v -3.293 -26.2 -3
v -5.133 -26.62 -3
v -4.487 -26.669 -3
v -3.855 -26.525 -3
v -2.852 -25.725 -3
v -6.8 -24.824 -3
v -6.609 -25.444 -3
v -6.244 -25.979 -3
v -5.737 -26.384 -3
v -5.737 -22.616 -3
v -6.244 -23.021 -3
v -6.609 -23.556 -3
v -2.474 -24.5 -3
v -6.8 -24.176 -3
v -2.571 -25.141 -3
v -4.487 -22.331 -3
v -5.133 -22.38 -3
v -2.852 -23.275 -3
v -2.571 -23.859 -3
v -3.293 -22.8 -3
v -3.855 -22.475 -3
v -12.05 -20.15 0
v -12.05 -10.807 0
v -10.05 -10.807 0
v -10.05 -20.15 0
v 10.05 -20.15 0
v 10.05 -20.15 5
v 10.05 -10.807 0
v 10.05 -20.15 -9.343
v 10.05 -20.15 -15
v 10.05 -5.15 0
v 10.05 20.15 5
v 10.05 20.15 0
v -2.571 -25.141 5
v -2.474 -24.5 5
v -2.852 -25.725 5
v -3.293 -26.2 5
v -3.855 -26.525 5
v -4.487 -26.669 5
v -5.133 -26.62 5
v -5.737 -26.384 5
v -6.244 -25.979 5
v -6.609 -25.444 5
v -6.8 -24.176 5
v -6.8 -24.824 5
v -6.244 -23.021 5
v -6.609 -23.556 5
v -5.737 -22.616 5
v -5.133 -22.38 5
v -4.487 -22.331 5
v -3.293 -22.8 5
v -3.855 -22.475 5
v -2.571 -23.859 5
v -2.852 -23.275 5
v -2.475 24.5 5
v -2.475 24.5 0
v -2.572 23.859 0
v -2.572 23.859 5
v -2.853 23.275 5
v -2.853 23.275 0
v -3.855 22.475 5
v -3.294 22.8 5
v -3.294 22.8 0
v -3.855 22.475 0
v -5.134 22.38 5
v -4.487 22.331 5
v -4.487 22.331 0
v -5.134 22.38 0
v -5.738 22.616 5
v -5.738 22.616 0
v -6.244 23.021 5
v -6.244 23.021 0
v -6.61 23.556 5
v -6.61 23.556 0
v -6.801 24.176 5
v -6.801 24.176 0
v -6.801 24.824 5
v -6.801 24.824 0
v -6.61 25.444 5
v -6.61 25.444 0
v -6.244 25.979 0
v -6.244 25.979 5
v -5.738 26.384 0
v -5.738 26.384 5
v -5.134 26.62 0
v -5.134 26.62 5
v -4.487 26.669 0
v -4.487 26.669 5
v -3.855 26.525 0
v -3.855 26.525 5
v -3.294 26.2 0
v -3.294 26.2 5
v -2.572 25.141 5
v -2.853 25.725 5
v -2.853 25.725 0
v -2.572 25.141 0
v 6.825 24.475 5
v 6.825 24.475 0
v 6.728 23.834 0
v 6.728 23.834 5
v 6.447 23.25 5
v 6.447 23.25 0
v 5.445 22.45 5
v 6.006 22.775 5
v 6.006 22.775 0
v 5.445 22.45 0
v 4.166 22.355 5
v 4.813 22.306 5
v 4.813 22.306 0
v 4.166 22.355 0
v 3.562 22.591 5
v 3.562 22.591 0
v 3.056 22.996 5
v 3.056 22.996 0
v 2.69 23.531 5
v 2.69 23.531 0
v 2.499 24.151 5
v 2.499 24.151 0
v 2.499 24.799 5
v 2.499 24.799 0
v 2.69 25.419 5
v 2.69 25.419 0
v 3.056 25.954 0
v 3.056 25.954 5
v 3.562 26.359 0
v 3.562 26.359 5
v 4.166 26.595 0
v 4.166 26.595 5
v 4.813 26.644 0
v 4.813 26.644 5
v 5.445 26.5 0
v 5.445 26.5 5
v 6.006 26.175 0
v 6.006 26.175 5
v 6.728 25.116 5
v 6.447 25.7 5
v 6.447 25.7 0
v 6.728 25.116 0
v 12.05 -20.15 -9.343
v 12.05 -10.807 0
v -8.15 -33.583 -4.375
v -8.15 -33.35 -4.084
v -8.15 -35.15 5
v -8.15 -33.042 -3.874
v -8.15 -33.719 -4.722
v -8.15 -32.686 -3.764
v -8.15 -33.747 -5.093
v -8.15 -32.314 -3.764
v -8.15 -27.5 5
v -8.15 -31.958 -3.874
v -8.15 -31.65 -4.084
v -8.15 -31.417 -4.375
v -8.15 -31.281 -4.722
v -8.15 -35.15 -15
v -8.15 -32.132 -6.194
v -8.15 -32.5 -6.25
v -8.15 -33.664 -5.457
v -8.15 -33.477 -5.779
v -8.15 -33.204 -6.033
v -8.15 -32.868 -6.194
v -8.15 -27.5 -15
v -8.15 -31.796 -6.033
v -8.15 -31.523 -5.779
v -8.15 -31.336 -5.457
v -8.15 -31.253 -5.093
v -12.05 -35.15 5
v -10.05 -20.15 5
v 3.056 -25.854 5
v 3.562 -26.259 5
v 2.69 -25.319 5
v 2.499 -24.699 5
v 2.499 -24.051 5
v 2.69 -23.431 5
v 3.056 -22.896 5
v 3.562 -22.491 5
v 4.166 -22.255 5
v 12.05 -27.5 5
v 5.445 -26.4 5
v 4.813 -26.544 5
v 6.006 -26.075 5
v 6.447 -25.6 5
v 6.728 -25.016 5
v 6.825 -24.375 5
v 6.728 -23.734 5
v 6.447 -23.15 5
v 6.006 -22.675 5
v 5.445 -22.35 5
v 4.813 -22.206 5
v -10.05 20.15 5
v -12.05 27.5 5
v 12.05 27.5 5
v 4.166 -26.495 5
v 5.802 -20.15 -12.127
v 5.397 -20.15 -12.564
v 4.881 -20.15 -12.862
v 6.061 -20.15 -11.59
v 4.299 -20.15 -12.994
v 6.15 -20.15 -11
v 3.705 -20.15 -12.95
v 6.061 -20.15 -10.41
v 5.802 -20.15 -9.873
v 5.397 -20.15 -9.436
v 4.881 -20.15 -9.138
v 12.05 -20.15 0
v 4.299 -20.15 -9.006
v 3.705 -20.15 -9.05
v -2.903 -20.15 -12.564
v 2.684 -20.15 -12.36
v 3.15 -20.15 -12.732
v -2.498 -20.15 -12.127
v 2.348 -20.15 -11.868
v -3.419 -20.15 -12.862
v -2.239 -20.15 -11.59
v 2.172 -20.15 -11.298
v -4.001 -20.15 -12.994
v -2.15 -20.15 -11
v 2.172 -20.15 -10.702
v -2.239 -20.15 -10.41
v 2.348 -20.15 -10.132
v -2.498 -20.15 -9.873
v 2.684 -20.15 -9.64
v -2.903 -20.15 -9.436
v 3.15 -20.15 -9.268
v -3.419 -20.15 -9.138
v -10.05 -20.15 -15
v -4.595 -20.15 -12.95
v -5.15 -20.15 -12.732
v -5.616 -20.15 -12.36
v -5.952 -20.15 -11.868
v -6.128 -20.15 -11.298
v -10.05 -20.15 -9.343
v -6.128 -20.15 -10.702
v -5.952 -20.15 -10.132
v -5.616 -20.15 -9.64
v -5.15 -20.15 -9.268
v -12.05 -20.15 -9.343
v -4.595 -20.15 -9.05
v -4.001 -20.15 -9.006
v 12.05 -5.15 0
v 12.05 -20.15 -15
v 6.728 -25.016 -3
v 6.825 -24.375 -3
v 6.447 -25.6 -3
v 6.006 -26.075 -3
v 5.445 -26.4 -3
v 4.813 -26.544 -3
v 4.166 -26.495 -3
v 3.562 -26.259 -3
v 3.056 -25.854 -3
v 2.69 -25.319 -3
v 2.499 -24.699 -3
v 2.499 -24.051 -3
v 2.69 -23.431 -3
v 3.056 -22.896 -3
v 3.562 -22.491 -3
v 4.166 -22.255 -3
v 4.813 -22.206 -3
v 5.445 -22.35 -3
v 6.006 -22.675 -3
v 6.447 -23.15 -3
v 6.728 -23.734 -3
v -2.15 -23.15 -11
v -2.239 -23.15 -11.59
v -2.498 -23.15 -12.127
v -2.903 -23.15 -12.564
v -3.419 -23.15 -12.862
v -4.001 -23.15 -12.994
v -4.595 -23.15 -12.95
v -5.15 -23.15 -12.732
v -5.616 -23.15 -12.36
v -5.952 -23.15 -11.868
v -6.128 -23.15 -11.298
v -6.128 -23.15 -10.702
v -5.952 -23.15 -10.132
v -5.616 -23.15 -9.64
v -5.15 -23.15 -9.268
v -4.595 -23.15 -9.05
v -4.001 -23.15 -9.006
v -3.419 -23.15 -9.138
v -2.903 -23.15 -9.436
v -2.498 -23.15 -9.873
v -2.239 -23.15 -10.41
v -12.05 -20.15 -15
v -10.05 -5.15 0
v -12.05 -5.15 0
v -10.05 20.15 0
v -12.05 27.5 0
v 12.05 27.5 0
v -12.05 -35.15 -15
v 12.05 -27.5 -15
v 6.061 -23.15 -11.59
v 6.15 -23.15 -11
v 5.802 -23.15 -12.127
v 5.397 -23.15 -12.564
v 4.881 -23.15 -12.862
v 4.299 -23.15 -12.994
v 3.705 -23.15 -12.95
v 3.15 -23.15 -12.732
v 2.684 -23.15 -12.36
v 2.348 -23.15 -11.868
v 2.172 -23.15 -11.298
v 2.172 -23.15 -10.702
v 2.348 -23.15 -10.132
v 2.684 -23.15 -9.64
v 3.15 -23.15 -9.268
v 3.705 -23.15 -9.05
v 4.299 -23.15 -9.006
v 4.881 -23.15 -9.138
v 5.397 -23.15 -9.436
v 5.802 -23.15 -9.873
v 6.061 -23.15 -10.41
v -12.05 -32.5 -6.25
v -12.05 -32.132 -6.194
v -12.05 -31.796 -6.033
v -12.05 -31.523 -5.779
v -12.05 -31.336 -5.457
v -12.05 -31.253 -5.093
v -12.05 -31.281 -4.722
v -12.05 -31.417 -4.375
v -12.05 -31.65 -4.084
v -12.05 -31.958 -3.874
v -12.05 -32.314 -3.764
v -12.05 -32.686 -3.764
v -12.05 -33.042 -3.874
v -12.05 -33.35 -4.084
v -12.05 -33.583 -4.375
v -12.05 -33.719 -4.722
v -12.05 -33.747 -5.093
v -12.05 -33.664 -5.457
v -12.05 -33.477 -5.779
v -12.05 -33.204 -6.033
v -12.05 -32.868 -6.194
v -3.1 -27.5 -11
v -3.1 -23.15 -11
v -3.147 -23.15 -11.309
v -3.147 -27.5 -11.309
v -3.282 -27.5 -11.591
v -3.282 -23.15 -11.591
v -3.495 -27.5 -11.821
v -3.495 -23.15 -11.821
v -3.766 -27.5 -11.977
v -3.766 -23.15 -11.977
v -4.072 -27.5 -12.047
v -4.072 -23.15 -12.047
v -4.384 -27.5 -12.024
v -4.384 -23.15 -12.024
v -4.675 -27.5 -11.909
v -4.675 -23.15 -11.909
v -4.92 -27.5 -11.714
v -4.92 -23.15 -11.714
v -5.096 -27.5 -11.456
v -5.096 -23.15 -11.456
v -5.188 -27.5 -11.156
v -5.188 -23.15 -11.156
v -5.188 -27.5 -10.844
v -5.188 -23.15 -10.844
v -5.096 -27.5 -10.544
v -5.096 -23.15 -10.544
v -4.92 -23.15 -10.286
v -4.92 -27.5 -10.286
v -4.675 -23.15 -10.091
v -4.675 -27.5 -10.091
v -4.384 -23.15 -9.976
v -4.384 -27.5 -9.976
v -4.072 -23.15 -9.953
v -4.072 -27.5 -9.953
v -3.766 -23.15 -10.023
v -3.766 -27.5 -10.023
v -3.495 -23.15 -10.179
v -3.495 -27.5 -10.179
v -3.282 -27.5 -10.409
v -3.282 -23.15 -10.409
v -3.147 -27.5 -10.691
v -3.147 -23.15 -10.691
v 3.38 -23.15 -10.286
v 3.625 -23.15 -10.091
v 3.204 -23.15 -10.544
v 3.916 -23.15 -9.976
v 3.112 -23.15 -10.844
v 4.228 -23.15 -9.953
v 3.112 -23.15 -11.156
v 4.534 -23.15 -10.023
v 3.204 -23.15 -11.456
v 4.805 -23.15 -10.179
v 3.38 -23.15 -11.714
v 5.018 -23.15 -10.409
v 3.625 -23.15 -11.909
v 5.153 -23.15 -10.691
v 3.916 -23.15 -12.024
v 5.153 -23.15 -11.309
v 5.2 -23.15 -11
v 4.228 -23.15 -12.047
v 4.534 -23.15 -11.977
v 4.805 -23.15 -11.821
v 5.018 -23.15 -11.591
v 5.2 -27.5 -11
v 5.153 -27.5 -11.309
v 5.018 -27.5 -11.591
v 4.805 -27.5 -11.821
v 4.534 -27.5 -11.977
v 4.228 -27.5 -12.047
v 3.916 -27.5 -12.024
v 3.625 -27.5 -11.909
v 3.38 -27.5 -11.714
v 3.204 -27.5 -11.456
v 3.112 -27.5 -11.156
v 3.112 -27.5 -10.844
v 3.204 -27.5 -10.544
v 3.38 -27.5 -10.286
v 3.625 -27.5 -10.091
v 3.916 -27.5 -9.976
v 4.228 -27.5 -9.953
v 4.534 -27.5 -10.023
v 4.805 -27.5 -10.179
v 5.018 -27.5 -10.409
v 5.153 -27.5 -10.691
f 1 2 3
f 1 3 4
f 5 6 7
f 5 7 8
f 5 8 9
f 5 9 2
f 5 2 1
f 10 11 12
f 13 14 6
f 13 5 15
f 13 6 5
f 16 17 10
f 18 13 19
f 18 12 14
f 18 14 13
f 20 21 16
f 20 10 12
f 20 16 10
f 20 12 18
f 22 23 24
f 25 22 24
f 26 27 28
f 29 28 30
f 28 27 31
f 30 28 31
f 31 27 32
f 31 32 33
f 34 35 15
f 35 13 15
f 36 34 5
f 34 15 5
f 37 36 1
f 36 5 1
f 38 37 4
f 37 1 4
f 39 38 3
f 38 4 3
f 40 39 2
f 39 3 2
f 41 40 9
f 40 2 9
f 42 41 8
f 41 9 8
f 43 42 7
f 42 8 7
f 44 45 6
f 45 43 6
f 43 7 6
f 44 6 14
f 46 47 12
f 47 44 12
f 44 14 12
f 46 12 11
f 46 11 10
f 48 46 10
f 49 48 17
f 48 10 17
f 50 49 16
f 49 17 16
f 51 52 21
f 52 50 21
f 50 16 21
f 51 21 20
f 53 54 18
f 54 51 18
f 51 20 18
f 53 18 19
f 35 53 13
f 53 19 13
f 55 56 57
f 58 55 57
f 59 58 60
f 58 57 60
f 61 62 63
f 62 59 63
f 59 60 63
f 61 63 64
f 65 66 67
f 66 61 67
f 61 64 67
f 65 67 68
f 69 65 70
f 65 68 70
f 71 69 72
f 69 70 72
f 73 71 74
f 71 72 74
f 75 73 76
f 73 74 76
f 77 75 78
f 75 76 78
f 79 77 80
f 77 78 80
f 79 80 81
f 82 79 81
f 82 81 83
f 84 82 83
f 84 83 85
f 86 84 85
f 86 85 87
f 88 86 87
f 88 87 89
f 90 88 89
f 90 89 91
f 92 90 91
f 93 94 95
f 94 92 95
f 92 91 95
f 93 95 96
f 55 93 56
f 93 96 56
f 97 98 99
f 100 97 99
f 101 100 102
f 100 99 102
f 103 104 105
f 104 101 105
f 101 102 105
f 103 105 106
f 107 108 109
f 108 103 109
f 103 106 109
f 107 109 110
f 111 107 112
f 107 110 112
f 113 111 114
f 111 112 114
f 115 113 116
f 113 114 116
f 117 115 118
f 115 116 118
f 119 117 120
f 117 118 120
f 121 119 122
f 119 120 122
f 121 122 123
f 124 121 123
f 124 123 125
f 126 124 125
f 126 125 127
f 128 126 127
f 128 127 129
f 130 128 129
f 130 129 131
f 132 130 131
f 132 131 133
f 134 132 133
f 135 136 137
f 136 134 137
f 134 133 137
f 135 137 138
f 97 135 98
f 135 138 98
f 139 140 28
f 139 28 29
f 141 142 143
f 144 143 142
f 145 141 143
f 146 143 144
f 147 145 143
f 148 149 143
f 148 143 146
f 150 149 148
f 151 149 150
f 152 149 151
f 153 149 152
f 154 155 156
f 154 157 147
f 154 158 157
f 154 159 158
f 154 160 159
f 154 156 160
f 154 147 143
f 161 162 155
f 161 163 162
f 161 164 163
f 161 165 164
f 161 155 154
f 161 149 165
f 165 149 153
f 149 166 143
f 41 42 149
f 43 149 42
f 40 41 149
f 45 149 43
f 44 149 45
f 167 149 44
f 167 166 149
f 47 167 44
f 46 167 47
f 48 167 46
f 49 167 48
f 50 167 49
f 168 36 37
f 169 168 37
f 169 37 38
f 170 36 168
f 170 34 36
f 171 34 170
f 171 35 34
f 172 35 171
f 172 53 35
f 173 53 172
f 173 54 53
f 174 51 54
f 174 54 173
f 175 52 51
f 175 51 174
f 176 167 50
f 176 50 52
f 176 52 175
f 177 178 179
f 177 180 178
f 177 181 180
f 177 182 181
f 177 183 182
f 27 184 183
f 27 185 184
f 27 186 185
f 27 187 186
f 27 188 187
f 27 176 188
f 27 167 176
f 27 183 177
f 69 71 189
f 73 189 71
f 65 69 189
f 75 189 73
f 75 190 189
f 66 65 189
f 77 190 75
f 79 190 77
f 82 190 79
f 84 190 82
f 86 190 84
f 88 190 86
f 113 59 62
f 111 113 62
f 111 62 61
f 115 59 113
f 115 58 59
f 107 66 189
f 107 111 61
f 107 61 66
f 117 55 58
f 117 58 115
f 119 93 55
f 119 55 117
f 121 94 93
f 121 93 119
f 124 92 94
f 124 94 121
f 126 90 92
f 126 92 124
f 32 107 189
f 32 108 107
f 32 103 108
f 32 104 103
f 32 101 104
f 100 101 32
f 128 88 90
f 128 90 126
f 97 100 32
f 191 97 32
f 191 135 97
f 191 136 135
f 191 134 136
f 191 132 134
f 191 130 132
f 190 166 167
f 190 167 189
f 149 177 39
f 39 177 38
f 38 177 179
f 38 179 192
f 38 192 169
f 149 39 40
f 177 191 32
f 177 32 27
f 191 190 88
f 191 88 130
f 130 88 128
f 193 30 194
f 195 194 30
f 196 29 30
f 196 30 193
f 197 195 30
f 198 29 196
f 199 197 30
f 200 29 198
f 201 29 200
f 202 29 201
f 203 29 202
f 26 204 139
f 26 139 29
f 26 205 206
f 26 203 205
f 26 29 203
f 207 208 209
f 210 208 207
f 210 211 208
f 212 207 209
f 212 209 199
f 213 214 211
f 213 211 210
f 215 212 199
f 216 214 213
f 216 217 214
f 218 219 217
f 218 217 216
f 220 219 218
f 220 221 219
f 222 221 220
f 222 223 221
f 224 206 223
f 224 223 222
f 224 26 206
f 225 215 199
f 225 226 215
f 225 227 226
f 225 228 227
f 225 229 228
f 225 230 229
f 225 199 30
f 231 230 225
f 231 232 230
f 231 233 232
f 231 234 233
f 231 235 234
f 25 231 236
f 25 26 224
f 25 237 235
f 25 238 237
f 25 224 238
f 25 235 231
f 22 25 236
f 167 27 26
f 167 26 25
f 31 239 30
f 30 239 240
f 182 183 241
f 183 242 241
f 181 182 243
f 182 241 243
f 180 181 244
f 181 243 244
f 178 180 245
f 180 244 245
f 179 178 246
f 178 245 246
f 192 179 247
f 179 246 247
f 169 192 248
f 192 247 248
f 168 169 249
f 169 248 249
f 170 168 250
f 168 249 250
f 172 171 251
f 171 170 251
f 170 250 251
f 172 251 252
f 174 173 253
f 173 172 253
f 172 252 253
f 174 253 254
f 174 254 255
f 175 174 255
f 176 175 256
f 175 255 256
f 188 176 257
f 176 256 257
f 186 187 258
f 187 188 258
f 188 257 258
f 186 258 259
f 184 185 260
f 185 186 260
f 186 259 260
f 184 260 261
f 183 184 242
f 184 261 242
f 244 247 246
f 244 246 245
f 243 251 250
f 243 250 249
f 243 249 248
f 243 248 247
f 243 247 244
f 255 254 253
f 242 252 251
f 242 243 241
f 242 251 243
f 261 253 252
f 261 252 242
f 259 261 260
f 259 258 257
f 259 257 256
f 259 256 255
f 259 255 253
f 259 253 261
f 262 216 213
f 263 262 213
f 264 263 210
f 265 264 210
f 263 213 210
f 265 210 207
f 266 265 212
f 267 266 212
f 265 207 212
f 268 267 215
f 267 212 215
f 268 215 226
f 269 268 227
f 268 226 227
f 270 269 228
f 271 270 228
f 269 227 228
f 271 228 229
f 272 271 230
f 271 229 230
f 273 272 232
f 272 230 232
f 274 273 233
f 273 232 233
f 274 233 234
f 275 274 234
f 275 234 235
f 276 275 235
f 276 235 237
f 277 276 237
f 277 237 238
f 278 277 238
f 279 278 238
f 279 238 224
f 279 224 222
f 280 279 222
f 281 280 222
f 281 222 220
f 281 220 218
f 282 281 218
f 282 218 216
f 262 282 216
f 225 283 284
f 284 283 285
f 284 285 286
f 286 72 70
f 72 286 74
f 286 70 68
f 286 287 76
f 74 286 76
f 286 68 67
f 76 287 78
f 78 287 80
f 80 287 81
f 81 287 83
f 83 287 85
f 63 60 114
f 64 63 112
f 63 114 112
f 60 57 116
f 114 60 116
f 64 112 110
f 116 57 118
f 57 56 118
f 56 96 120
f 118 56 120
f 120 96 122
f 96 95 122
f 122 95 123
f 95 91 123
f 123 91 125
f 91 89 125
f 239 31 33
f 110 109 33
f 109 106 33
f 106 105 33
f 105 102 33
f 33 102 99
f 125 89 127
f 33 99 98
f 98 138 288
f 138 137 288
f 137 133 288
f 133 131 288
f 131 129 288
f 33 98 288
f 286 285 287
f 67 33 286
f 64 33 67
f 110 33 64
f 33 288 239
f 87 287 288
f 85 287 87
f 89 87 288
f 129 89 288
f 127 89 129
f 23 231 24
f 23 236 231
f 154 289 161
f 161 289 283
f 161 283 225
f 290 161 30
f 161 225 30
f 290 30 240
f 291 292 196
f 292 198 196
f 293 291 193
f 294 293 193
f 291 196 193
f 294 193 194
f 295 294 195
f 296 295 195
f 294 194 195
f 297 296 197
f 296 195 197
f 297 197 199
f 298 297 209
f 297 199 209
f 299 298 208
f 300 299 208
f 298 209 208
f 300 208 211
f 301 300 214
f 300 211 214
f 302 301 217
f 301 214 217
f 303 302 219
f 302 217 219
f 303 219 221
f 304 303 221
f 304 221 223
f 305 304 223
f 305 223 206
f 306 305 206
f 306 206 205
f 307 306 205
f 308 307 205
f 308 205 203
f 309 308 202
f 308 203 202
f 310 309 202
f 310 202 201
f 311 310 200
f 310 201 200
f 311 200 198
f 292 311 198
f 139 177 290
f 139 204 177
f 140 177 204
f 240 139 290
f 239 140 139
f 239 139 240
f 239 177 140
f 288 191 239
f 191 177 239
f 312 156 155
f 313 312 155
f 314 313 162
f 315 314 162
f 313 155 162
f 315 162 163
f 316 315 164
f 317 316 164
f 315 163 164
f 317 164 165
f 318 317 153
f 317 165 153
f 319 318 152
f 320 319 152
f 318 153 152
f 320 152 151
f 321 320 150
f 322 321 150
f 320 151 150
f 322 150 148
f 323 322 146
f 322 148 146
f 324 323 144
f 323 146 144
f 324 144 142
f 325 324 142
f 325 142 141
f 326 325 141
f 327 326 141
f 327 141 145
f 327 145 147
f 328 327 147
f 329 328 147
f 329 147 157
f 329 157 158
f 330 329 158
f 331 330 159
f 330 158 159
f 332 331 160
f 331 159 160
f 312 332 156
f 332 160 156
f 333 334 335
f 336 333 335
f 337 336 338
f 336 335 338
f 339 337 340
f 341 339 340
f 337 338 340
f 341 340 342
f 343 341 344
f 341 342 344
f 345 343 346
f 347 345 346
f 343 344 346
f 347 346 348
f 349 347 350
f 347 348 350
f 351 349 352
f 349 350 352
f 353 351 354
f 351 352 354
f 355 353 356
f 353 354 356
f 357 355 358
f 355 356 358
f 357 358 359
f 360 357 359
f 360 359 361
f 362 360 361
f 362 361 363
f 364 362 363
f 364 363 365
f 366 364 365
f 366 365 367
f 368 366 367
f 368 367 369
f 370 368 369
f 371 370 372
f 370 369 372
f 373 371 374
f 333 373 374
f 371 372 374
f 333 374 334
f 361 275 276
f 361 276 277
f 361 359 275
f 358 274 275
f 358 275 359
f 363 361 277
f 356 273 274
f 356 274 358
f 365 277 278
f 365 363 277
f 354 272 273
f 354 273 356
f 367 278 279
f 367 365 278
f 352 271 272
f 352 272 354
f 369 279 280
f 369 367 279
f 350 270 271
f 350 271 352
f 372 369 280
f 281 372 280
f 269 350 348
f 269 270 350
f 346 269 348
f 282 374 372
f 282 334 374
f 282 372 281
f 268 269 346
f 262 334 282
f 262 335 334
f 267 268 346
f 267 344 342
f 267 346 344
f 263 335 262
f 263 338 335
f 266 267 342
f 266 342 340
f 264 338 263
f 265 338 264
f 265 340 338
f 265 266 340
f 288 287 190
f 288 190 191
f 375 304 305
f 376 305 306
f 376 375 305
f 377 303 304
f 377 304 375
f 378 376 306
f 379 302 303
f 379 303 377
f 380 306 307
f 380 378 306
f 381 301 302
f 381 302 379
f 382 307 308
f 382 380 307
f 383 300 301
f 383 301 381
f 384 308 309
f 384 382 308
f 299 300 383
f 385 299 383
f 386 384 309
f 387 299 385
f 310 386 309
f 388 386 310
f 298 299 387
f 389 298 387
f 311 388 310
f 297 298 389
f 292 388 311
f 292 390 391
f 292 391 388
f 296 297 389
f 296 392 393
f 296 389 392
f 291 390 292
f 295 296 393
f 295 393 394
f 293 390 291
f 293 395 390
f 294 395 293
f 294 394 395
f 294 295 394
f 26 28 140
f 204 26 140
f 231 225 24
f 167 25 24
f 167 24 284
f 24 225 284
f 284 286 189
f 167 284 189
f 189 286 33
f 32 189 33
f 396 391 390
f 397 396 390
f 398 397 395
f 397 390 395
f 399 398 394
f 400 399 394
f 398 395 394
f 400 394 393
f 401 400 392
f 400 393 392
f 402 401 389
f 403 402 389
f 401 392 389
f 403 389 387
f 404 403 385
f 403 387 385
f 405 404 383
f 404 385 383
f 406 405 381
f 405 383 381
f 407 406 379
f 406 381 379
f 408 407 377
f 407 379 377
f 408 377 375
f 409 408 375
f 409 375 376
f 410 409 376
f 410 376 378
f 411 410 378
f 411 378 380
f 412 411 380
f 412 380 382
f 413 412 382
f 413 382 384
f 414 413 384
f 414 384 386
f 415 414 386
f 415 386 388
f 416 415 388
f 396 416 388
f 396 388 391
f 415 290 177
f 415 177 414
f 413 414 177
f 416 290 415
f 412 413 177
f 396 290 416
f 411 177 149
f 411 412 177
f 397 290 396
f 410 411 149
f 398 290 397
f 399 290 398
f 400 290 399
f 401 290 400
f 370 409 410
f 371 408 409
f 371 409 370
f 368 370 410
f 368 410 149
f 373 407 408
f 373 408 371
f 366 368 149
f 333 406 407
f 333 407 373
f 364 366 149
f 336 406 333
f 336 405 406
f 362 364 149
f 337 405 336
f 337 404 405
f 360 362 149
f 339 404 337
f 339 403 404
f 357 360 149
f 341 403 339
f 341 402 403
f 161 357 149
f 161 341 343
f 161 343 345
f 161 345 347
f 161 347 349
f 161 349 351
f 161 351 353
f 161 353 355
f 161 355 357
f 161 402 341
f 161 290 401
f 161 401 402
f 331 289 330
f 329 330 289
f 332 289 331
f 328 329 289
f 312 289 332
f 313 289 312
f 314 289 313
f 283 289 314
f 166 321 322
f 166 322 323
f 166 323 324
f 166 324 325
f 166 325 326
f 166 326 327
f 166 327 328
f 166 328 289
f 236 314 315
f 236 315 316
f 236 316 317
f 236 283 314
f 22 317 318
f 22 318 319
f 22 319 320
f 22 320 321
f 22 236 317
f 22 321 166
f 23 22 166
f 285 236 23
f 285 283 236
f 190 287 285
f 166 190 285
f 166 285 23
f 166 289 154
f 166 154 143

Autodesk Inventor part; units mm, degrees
ref_plane "YZ Plane" through (0, 0, 0) normal (1, 0, 0) x (0, 1, 0)
ref_plane "XZ Plane" through (0, 0, 0) normal (0, 1, 0) x (-1, 0, 0)
sketch "Sketch1" plane through (0, 0, 0) normal (0, 0, 1) x (1, 0, 0)
  line L0 (-12.05, 27.5) -> (12.05, 27.5)
  line L1 (12.05, 27.5) -> (12.05, -27.5)
  line L2 (12.05, -27.5) -> (-12.05, -27.5)
  line L3 (-12.05, -27.5) -> (-12.05, 27.5)
  line L4 (-10.05, 20.15) -> (10.05, 20.15)
  line L5 (10.05, 20.15) -> (10.05, -20.15)
  line L6 (10.05, -20.15) -> (-10.05, -20.15)
  line L7 (-10.05, -20.15) -> (-10.05, 20.15)
  line L8 (0, 0) -> (0, 17.7516) construction
  line L9 (0, 0) -> (17.0454, 0) construction
  line L10 (-12.05, -27.5) -> (12.05, -27.5)
  line L11 (12.05, -27.5) -> (12.05, -20.15)
  line L12 (12.05, -20.15) -> (-12.05, -20.15)
  line L13 (-12.05, -20.15) -> (-12.05, -27.5)
  circle A0 centre (-4.65, 24.5) radius 2.175
  circle A1 centre (4.65, 24.475) radius 2.175
  circle A2 centre (-4.6492, -24.5) radius 2.175
  circle A3 centre (4.65, -24.375) radius 2.175
  point P0 (12.05, -23.825)
  dimension "d0" = 40.3
  dimension "d1" = 20.1
  dimension "d2" = 55
  dimension "d3" = 24.1
  dimension "d4" = 4.35
  dimension "d5" = 4.325
  dimension "d6" = 4.35
  dimension "d8" = 4.35
  dimension "d9" = 5.4
  dimension "d13" = 5.4
  dimension "d28" = 48.85
  dimension "d29" = 9.3
  dimension "d30" = 9.3
extrude "Extrusion1" add sketch "Sketch1" along normal blind 5 contours L0 L1 L12 L5 L4 L7 L3 | L12 L6 L1 L2 L3
extrude "Extrusion2" add sketch "Sketch1" against normal blind 15 contours L12 L6 L1 L2 L3 | A2 | A3
extrude "Extrusion3" cut sketch "Sketch1" against normal blind 3 contours A2 | A3
sketch "Sketch2" plane through (-10.05, -20.15, 5) normal (0, 1, 0) x (1, 0, 0)
  circle A0 centre (5.9, 16) radius 1.05
  circle A1 centre (14.2, 16) radius 1.05
  line L0 (0, 0) -> (20.1, 0) construction
  line L1 (10.05, 0) -> (10.05, 23.167) construction
  line L2 (-2, 20) -> (22.1, 20) projected
  circle A2 centre (14.2, 16) radius 2
  circle A3 centre (5.9, 16) radius 2
  point P0 (10.05, 5)
  dimension "d20" = 2.1
  dimension "d21" = 8.3
  dimension "d22" = 4
  dimension "d23" = 4
extrude "Extrusion4" cut sketch "Sketch2" against normal blind 10 contours A0 | A1
extrude "Extrusion5" cut sketch "Sketch2" against normal blind 3 contours A0 | A1 | A2 | A3
sketch "Sketch3" plane through (12.05, -20.15, 0) normal (1, 0, 0) x (0, 0, -1)
  line L0 (0, 47.65) -> (-5, 47.65) construction
  line L1 (-5, 47.65) -> (38.6712, 47.65) construction
  line L2 (0, 0) -> (-5, 0) construction
  line L3 (-5, 0) -> (38.6712, 0) construction
  line L4 (0, 15) -> (15, 0)
  line L5 (0, 15) -> (0, 9.3431)
  line L6 (0, 9.3431) -> (9.3431, 0)
  line L7 (9.3431, 0) -> (15, 0)
  line L8 (15, 0) -> (15, -7.35) construction
  line L9 (15, -0.9137) -> (15, 2.4866) construction
  line L10 (-5, 0) -> (15, 0)
  line L11 (15, 0) -> (15, -15)
  line L12 (15, -15) -> (-5, -15)
  line L13 (-5, -15) -> (-5, 0)
  circle A0 centre (5, -12.35) radius 1.25
  line L14 (0, 0) -> (0, 47.65) projected
  line L15 (0, 47.65) -> (0, 0) projected
  line L16 (0, 0) -> (15, 0) projected
  line L17 (15, -7.35) -> (15, 0) projected
  line L18 (15, -7.35) -> (-5, -7.35) projected
  line L19 (-5, 47.65) -> (-5, -7.35) projected
  line L20 (0, 47.65) -> (-5, 47.65) projected
  point P0 (0, 20.15)
  dimension "d31" = 4
  dimension "d34" = 15
  dimension "d39" = 2.5
  dimension "d41" = 10
  dimension "d44" = 45
  dimension "d46" = 5
ref_plane "Work Plane1" through (0, -20.15, 0) normal (-1, 0, 0) x (0, 0, 1)
extrude "Extrusion6" add sketch "Sketch3" against normal up to surface (2 mm away) contours L4 L7 L6 L5
mirror "Mirror1" about plane through (0, -20.15, 0) normal (-1, 0, 0) of "Extrusion6"
extrude "Extrusion7" add sketch "Sketch3" along normal blind 3.9 from surface at -24.1 contours L11 L18 L13 L10 L7 | L11 L12 L13 L18 | A0
extrude "Extrusion8" cut sketch "Sketch3" against normal blind 35.65 contours A0
equation "\"d8\" = d6"
equation "\"d13\" = d9"
properties part number "BIGServoHolder"
